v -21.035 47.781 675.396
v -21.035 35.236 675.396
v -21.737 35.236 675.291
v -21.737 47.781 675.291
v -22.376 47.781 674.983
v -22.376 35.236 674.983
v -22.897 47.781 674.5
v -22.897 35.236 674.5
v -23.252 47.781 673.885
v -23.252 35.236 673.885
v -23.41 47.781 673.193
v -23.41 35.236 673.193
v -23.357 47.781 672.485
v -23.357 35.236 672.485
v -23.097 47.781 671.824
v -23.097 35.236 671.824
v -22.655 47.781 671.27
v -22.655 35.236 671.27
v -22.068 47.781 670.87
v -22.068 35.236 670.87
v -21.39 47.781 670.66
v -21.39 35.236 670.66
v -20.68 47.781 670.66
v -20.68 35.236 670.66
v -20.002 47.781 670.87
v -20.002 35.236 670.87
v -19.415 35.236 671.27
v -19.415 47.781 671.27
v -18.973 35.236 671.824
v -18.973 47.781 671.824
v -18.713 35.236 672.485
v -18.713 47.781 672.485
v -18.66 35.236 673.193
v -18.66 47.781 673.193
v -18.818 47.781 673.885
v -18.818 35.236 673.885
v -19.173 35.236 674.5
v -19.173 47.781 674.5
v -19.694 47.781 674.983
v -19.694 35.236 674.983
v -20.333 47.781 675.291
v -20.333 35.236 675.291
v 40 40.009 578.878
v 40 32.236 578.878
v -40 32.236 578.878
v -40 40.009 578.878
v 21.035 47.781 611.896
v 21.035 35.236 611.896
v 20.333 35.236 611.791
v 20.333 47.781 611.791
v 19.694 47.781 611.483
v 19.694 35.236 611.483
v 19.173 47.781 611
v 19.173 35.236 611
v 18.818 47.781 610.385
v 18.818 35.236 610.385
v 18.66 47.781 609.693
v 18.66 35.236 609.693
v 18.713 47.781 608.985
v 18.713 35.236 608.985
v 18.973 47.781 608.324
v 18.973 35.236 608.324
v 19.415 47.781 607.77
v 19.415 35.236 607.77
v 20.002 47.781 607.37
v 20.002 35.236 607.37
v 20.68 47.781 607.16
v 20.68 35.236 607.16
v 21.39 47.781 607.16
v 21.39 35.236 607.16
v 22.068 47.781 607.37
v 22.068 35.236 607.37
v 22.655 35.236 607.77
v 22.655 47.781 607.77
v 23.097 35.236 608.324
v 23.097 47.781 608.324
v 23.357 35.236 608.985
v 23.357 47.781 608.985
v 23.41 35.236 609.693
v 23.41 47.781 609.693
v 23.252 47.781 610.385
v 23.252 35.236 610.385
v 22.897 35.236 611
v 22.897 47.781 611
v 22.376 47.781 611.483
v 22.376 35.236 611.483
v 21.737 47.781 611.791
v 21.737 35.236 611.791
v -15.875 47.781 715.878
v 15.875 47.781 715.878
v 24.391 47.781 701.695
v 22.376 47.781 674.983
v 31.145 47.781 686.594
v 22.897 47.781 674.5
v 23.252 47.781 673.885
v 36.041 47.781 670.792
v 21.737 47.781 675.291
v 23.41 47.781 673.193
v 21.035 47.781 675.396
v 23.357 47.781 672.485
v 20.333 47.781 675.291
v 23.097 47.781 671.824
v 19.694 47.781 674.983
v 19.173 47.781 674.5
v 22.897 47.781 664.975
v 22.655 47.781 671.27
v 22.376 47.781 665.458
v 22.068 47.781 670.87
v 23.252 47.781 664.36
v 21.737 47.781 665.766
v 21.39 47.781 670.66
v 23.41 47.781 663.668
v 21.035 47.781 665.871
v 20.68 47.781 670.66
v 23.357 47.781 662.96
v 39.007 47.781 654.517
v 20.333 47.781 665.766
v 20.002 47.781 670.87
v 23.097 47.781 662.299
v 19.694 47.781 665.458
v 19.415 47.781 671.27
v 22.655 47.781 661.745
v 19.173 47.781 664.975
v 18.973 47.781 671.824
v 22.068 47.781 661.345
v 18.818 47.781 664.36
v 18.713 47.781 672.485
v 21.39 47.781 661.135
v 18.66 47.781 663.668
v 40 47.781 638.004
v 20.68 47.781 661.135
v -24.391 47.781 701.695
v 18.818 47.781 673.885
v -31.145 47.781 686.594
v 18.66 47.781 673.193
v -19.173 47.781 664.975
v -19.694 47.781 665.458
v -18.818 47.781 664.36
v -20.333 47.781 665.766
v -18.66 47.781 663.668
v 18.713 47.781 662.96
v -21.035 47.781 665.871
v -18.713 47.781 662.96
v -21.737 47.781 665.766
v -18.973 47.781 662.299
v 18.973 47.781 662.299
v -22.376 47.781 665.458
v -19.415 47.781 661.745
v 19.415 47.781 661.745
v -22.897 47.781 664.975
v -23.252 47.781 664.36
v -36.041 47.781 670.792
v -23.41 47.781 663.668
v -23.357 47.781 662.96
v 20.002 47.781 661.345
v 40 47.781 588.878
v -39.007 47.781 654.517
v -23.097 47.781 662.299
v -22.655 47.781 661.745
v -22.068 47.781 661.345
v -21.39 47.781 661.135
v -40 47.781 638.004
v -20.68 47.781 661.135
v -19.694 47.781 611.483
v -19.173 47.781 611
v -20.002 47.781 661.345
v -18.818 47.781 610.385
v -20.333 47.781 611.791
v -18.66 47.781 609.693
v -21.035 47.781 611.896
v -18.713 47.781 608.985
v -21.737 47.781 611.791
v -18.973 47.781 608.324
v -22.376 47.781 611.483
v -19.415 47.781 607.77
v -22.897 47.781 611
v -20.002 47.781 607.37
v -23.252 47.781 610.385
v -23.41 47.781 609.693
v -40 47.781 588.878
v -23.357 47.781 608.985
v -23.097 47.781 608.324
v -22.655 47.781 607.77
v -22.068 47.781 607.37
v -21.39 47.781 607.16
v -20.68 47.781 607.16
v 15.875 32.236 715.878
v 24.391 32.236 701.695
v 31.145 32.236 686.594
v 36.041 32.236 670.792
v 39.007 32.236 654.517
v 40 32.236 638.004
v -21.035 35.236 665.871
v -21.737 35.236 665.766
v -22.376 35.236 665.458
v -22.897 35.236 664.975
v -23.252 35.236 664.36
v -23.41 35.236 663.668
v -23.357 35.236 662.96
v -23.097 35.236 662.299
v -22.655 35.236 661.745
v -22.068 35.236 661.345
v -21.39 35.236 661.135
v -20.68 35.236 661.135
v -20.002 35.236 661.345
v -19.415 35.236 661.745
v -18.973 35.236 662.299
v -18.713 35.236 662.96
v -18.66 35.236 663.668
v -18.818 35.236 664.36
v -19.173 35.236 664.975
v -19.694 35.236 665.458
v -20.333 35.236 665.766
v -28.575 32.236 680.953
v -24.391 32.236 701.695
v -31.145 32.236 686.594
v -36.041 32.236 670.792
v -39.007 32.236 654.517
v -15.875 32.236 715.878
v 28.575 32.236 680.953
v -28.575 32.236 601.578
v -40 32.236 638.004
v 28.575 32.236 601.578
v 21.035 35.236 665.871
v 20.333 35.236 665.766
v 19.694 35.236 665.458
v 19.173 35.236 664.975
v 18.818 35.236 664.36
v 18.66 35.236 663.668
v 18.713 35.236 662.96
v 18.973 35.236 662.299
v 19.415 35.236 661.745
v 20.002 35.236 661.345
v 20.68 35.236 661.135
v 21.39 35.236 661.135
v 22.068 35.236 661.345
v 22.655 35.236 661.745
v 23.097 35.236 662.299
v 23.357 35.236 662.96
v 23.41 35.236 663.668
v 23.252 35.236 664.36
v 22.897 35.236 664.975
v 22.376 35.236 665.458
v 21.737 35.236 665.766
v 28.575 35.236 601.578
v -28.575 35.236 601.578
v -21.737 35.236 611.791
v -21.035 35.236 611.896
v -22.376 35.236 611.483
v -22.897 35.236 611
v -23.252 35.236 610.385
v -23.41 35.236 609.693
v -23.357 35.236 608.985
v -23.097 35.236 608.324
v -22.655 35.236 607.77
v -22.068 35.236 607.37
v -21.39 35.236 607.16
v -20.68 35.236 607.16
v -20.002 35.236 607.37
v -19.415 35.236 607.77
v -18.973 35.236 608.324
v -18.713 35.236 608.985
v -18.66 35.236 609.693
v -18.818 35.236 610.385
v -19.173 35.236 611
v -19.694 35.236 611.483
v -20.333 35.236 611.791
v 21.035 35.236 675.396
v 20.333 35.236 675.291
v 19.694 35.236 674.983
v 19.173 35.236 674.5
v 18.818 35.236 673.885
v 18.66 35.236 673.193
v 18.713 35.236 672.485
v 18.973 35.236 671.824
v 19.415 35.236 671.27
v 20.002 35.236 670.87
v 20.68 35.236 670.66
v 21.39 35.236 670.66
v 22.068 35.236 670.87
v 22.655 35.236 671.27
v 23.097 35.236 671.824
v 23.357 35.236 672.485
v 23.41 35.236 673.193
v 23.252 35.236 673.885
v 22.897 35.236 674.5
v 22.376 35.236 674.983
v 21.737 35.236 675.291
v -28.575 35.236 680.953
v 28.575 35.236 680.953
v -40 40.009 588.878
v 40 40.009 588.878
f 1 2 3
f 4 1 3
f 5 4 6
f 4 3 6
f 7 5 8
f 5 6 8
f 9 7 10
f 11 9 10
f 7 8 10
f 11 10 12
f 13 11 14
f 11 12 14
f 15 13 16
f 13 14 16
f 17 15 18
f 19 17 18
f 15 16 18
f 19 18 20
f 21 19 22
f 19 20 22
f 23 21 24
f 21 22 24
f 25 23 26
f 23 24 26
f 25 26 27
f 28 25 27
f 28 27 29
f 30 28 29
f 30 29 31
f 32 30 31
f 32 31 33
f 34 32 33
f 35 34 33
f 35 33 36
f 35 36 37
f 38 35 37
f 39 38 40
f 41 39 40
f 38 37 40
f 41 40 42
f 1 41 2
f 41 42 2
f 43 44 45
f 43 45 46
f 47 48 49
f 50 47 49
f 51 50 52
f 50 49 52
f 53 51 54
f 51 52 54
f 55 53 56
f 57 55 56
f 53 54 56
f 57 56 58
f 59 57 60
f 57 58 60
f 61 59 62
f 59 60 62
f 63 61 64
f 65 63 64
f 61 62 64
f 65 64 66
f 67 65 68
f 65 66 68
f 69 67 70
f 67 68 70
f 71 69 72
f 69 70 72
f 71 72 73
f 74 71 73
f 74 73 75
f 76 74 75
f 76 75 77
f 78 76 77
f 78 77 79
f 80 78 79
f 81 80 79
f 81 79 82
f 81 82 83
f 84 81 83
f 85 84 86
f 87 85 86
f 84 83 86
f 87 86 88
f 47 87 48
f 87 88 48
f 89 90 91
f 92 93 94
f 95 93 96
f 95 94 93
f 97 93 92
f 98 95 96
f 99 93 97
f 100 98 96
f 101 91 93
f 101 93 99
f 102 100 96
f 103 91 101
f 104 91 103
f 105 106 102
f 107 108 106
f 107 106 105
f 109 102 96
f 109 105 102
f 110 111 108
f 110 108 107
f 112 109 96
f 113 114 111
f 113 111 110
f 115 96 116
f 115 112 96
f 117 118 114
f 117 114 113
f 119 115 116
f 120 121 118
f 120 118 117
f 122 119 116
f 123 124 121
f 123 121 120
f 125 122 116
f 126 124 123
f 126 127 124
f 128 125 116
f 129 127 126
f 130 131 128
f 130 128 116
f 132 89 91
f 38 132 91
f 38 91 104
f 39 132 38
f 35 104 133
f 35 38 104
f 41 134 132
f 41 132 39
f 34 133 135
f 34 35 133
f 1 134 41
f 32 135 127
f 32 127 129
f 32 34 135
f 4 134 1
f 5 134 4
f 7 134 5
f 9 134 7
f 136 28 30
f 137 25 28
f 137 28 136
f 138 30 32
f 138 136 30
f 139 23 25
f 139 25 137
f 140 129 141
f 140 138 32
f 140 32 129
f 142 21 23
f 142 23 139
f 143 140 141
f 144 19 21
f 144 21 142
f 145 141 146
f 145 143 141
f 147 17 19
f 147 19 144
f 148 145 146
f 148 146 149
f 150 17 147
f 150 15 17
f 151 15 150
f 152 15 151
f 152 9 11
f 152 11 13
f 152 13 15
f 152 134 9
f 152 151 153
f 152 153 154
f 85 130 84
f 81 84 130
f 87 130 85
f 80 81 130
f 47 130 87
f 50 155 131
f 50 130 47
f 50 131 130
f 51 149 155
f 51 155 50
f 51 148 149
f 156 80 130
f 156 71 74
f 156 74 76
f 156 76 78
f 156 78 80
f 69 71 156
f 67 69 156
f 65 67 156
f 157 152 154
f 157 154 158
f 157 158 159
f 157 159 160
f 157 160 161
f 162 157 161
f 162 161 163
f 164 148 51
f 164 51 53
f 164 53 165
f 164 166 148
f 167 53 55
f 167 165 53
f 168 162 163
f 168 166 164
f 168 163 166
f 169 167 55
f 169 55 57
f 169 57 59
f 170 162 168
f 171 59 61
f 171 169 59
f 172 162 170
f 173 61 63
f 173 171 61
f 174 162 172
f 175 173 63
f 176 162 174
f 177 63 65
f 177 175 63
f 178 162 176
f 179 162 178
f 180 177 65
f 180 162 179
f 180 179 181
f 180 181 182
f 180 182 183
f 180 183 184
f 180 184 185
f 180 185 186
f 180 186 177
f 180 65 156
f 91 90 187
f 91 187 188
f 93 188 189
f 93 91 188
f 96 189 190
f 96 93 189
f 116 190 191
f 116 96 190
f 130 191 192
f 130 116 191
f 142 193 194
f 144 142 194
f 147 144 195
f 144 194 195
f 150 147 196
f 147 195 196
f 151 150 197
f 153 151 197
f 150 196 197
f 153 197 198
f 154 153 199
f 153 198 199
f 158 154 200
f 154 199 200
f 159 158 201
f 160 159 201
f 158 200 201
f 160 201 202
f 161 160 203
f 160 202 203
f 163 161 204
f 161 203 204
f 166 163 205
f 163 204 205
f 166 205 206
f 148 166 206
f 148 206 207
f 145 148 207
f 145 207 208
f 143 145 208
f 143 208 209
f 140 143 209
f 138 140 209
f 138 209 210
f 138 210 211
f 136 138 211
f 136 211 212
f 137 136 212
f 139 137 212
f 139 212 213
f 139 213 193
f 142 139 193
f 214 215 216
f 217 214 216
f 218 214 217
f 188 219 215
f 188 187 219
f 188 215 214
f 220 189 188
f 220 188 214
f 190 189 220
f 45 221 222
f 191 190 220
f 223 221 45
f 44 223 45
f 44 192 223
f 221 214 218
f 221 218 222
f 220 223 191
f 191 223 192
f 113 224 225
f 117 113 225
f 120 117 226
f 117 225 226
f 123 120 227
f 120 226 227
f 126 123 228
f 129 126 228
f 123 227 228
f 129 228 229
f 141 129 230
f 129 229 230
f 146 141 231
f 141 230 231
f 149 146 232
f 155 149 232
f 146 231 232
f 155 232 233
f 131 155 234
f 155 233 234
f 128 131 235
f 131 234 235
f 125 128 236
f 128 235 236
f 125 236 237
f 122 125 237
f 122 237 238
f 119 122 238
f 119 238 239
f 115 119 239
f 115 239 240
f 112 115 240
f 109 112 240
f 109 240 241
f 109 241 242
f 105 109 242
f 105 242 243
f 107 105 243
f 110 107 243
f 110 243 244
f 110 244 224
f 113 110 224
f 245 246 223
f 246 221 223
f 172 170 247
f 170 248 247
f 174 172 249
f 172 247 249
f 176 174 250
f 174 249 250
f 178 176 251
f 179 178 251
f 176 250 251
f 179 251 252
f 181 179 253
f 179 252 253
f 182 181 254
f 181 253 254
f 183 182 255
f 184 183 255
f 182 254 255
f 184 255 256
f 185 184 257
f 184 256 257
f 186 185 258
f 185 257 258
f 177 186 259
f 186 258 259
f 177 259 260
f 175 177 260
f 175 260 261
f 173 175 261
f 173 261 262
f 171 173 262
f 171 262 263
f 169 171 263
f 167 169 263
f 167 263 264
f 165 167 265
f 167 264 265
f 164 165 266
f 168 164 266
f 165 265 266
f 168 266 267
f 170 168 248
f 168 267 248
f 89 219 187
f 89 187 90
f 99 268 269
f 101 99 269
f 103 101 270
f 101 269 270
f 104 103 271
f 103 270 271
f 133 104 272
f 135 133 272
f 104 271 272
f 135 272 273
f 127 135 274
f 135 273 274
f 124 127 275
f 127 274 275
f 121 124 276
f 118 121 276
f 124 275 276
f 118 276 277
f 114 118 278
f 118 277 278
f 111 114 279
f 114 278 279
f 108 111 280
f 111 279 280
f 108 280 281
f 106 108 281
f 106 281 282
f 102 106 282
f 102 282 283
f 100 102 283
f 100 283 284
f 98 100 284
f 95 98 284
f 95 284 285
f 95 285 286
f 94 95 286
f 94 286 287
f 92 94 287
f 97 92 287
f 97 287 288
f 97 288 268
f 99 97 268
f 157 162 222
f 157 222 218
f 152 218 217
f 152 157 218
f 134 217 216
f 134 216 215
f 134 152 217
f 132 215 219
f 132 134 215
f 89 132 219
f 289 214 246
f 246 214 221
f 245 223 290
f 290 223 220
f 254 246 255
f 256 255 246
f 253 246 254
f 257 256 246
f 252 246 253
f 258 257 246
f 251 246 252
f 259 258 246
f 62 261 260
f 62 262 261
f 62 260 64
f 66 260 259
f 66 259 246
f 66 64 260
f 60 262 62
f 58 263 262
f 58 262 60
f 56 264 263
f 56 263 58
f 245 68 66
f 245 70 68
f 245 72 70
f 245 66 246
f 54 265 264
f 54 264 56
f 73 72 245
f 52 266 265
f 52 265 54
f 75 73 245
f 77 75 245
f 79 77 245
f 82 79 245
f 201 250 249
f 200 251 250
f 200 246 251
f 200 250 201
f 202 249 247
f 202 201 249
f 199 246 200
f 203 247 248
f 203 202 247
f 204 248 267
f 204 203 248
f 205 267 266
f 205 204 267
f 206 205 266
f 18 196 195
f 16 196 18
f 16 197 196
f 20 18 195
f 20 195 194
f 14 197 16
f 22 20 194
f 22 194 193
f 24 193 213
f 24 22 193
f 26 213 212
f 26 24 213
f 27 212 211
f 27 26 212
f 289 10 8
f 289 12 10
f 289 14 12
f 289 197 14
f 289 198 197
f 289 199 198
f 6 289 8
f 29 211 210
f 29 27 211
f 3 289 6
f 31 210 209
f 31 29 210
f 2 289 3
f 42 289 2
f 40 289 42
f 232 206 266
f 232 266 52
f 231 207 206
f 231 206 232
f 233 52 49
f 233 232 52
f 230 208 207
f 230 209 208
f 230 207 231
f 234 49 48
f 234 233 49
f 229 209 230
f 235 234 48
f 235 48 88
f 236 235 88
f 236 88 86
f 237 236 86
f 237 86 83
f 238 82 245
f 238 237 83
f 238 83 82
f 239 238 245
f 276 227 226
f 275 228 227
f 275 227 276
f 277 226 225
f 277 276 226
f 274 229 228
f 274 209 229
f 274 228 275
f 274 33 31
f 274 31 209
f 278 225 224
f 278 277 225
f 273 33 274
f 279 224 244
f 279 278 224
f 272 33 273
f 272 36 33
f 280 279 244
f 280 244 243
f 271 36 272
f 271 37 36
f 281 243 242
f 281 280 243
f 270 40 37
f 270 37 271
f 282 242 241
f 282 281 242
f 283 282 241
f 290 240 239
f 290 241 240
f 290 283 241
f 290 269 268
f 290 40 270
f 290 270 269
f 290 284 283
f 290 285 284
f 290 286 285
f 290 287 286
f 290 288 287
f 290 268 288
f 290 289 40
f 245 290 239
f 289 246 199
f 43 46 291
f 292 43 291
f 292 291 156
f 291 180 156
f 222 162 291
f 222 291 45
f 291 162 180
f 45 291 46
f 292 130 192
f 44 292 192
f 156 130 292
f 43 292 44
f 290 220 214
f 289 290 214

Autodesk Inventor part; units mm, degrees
ref_plane "YZ Plane" through (0, 0, 0) normal (1, 0, 0) x (0, 1, 0)
ref_plane "XZ Plane" through (0, 0, 0) normal (0, 1, 0) x (-1, 0, 0)
sketch "Sketch1" plane through (0, 0, 0) normal (0, 1, 0) x (-1, 0, 0)
  line L0 (-40, 482.6) -> (-40, -482.6)
  line L1 (-40, -482.6) -> (40, -482.6)
  line L2 (40, -482.6) -> (40, 482.6)
  line L3 (40, 482.6) -> (-40, 482.6)
  line L4 (-40, 482.6) -> (40, -482.6) construction
  line L5 (-40, -482.6) -> (40, 482.6) construction
  point P0 (0, 0)
  dimension "d0" = 965.2
  dimension "d1" = 80
extrude "Extrusion1" add sketch "Sketch1" against normal blind 15.5448
ref_plane "Work Plane1" through (0, 0, 482.6) normal (1, 0, 0) x (0, 1, 0)
sketch "Sketch2" plane through (0, 0, 482.6) normal (1, 0, 0) x (0, 1, 0)
  line L0 (0, -965.2) -> (0, 0) projected
  line L1 (0, -965.2) -> (-15.5448, -965.2) projected
  line L2 (-15.5448, 0) -> (-15.5448, -965.2) projected
  line L3 (0, 0) -> (-15.5448, 0) projected
  line L4 (41.9902, -1050.1493) -> (41.9902, -1135.1493)
  line L5 (57.0671, -1050.1493) -> (57.0671, -1135.1493)
  line L6 (57.0671, -1135.1493) -> (41.9902, -1135.1493)
  line L7 (41.9902, -1092.6493) -> (57.0671, -1092.6493) construction
  line L8 (-15.5448, 0) -> (-15.5448, -965.2) construction
  line L9 (-15.5448, -965.2) -> (-15.5448, -1004.6981) construction
  line L10 (-15.5448, -1004.6981) -> (41.9902, -1021.6042) construction
  line L11 (41.9902, -1021.6042) -> (41.9902, -1050.1493) construction
  spline S0 degree 3 poles (-15.5448, -965.2) (-15.5448, -1004.6981) (41.9902, -1021.6042) (41.9902, -1050.1493) knots 1 1 1 1 2 2 2 2
  line L12 (57.0671, -1050.1493) -> (57.0671, -1021.6042) construction
  line L13 (57.0671, -1021.6042) -> (0, -1003.1803) construction
  line L14 (0, -965.2) -> (0, 0) construction
  line L15 (0, -1003.1803) -> (0, -965.2) construction
  spline S1 degree 3 poles (57.0671, -1050.1493) (57.0671, -1021.6042) (0, -1003.1803) (0, -965.2) knots 1 1 1 1 2 2 2 2
  point P0 (0, -482.6)
  dimension "d4" = 85
  dimension "d5" = 15.0769
sketch "Sketch3" plane through (0, 0, 482.6) normal (1, 0, 0) x (0, 1, 0)
  line L0 (0, 0) -> (0, -965.2) projected
  line L1 (0, 0) -> (-15.5448, 0) projected
  line L2 (-15.5448, -965.2) -> (-15.5448, 0) projected
  line L3 (0, -965.2) -> (-15.5448, -965.2) projected
  arc A0 (2.1293, 48.5593) -> (-15.5448, 0) centre (60, 0) ccw
  arc A1 (14.0373, 38.5673) -> (0, 0) centre (60, 0) ccw
  line L4 (2.1293, 48.5593) -> (18.199, 67.7104)
  line L5 (0, 0) -> (-15.5448, 0) construction
  line L6 (2.1293, 48.5593) -> (14.0373, 38.5673) construction
  line L7 (14.0373, 38.5673) -> (30.107, 57.7184)
  arc A2 (18.199, 67.7104) -> (32.2363, 106.2776) centre (-27.7637, 106.2776) ccw
  arc A3 (30.107, 57.7184) -> (47.7811, 106.2776) centre (-27.7637, 106.2776) ccw
  line L8 (32.2363, 106.2776) -> (32.2363, 233.2776)
  line L9 (32.2363, 233.2776) -> (47.7811, 233.2776)
  line L10 (47.7811, 233.2776) -> (47.7811, 106.2776)
  line L11 (30.107, 57.7184) -> (18.199, 67.7104) construction
  line L12 (32.2363, 106.2776) -> (47.7811, 106.2776) construction
  point P0 (0, -482.6)
  dimension "d17" = 127
  dimension "d18" = 140
  dimension "d19" = 60
  dimension "d21" = 140
  dimension "d22" = 25
extrude "Extrusion2" add sketch "Sketch3" along normal up to surface (80 mm away) from surface at -40 contours L1 A0 L4 A2 L8 L9 L10 A3 L7 A1
sketch "Sketch9" plane through (-40, 47.7811, 588.8776) normal (0, 1, 0) x (1, 0, 0)
  line L0 (0, -127) -> (0, 0) construction
  line L1 (0, 0) -> (0, -127) construction
  line L2 (80, -127) -> (80, 0) construction
  line L3 (0, -127) -> (0, -49.1262)
  line L4 (80, 0) -> (80, -127) projected
  line L5 (80, -49.1262) -> (80, -127)
  arc A0 (0, -49.1262) -> (24.125, -127) centre (137.7482, -49.1262) ccw
  arc A1 (55.875, -127) -> (80, -49.1262) centre (-57.7482, -49.1262) ccw
  line L6 (24.125, -127) -> (55.875, -127)
  line L7 (0, -127) -> (80, -127) projected
  line L8 (55.875, -127) -> (80, -127)
  line L9 (80, -127) -> (80, -49.1262)
  line L10 (0, -127) -> (24.125, -127)
  line L11 (55.875, -127) -> (80, -127)
  line L12 (24.125, -127) -> (0, -127)
  point P0 (40, 588.8776)
  dimension "d41" = 31.75
sketch "Sketch10" plane through (-40, 47.7811, 588.8776) normal (0, 1, 0) x (1, 0, 0)
  line L0 (11.425, -92.075) -> (68.575, -92.075) construction
  line L1 (68.575, -92.075) -> (68.575, -12.7) construction
  line L2 (68.575, -12.7) -> (11.425, -12.7) construction
  line L3 (11.425, -12.7) -> (11.425, -92.075) construction
  line L4 (11.425, -92.075) -> (68.575, -12.7) construction
  line L5 (68.575, -92.075) -> (11.425, -12.7) construction
  line L6 (12.6315, -90.043) -> (67.3685, -90.043)
  line L7 (67.3685, -90.043) -> (67.3685, -14.732)
  line L8 (67.3685, -14.732) -> (12.6315, -14.732)
  line L9 (12.6315, -14.732) -> (12.6315, -90.043)
  line L10 (12.6315, -90.043) -> (67.3685, -14.732) construction
  line L11 (67.3685, -90.043) -> (12.6315, -14.732) construction
  line L12 (18.965, -84.1375) -> (61.035, -84.1375) construction
  line L13 (61.035, -84.1375) -> (61.035, -20.6375) construction
  line L14 (61.035, -20.6375) -> (18.965, -20.6375) construction
  line L15 (18.965, -20.6375) -> (18.965, -84.1375) construction
  line L16 (18.965, -84.1375) -> (61.035, -20.6375) construction
  line L17 (61.035, -84.1375) -> (18.965, -20.6375) construction
  line L18 (18.965, -84.1375) -> (61.035, -84.1375) construction
  line L19 (61.035, -84.1375) -> (61.035, -74.6125) construction
  line L20 (61.035, -74.6125) -> (18.965, -74.6125) construction
  line L21 (18.965, -74.6125) -> (18.965, -84.1375) construction
  line L22 (68.575, -12.7) -> (80, -12.7) construction
  line L23 (11.425, -12.7) -> (0, -12.7) construction
  line L24 (0, -127) -> (0, 0) construction
  line L25 (80, -127) -> (80, 0) projected
  line L26 (0, 0) -> (80, 0) projected
  point P0 (40, 588.8776)
  point P1 (40, -52.3875)
  dimension "d33" = 57.15
  dimension "d34" = 79.375
  dimension "d35" = 54.737
  dimension "d36" = 75.311
  dimension "d37" = 42.07
  dimension "d38" = 63.5
  dimension "d39" = 9.525
  dimension "d40" = 12.7
extrude "Extrusion7" cut sketch "Sketch9" against normal through all
hole "Hole1" at (-21.035, 47.7811, 673.0151) at (-21.035, 47.7811, 663.4901) at (21.035, 47.7811, 673.0151) at (21.035, 47.7811, 663.4901) at (21.035, 47.7811, 609.5151) at (-21.035, 47.7811, 609.5151) direction (0, -1, 0) diameter 4.7625 end through all
sketch "Sketch11" plane through (-40, 32.2363, 588.8776) normal (0, -1, 0) x (1, 0, 0)
  line L0 (11.425, 92.075) -> (68.575, 92.075) construction
  line L1 (11.425, 12.7) -> (11.425, 92.075) construction
  line L2 (68.575, 92.075) -> (68.575, 12.7) construction
  line L3 (11.425, 12.7) -> (68.575, 12.7)
  line L4 (68.575, 12.7) -> (68.575, 92.075)
  line L5 (68.575, 92.075) -> (11.425, 92.075)
  line L6 (11.425, 92.075) -> (11.425, 12.7)
  line L7 (11.425, 12.7) -> (68.575, 92.075) construction
  line L8 (68.575, 12.7) -> (11.425, 92.075) construction
  point P0 (40, -588.8776)
  point P1 (40, 52.3875)
extrude "Extrusion8" cut sketch "Sketch11" against normal blind 3
sketch "Sketch12" plane through (-40, 47.7811, 588.8776) normal (0, 1, 0) x (1, 0, 0)
  line L0 (80, -127) -> (0, -127)
  line L1 (0, -127) -> (0, 0)
  line L2 (0, 0) -> (80, 0)
  line L3 (80, 0) -> (80, -127)
  line L4 (24.125, -127) -> (55.875, -127) projected
  line L5 (0, 0) -> (0, -49.1262) projected
  point P0 (40, 588.8776)
extrude "Extrusion9" cut sketch "Sketch12" against normal through all keep common part
sketch "Sketch13" plane through (40, 32.2363, 638.0038) normal (1, 0, 0) x (0, 0, -1)
  line L0 (49.1262, 15.5448) -> (49.1262, 0) projected
  line L1 (0, 15.5448) -> (49.1262, 15.5448) projected
  line L2 (0, 0) -> (0, 15.5448) projected
  line L3 (49.1262, 0) -> (0, 0) projected
  line L4 (26.1074, 3) -> (26.1074, 15.5448) projected
  line L5 (30.8699, 3) -> (30.8699, 15.5448) projected
  line L6 (-42.9488, 3) -> (36.4262, 3) projected
  line L7 (36.4262, 0) -> (36.4262, 3) projected
  line L8 (49.1262, 0) -> (59.1262, 0)
  line L9 (59.1262, 0) -> (59.1262, 7.7724)
  line L10 (59.1262, 7.7724) -> (49.1262, 7.7724)
  line L11 (49.1262, 7.7724) -> (49.1262, 0)
  line L12 (49.1262, 15.5448) -> (39.1262, 15.5448)
  line L13 (39.1262, 15.5448) -> (39.1262, 7.7724)
  line L14 (39.1262, 7.7724) -> (49.1262, 7.7724)
  line L15 (49.1262, 7.7724) -> (49.1262, 15.5448)
  line L16 (39.1262, 15.5448) -> (49.1262, 7.7724)
  line L17 (49.1262, 0) -> (49.1262, 15.5448) projected
  line L18 (39.1262, 15.5448) -> (49.1262, 15.5448)
  point P0 (638.0038, -32.2363)
  dimension "d58" = 10
extrude "Extrusion10" add sketch "Sketch13" against normal up to surface (80 mm away) contours L10 L9 L8 L0
properties part number "Metal Middle" material "Aluminum 6061"
